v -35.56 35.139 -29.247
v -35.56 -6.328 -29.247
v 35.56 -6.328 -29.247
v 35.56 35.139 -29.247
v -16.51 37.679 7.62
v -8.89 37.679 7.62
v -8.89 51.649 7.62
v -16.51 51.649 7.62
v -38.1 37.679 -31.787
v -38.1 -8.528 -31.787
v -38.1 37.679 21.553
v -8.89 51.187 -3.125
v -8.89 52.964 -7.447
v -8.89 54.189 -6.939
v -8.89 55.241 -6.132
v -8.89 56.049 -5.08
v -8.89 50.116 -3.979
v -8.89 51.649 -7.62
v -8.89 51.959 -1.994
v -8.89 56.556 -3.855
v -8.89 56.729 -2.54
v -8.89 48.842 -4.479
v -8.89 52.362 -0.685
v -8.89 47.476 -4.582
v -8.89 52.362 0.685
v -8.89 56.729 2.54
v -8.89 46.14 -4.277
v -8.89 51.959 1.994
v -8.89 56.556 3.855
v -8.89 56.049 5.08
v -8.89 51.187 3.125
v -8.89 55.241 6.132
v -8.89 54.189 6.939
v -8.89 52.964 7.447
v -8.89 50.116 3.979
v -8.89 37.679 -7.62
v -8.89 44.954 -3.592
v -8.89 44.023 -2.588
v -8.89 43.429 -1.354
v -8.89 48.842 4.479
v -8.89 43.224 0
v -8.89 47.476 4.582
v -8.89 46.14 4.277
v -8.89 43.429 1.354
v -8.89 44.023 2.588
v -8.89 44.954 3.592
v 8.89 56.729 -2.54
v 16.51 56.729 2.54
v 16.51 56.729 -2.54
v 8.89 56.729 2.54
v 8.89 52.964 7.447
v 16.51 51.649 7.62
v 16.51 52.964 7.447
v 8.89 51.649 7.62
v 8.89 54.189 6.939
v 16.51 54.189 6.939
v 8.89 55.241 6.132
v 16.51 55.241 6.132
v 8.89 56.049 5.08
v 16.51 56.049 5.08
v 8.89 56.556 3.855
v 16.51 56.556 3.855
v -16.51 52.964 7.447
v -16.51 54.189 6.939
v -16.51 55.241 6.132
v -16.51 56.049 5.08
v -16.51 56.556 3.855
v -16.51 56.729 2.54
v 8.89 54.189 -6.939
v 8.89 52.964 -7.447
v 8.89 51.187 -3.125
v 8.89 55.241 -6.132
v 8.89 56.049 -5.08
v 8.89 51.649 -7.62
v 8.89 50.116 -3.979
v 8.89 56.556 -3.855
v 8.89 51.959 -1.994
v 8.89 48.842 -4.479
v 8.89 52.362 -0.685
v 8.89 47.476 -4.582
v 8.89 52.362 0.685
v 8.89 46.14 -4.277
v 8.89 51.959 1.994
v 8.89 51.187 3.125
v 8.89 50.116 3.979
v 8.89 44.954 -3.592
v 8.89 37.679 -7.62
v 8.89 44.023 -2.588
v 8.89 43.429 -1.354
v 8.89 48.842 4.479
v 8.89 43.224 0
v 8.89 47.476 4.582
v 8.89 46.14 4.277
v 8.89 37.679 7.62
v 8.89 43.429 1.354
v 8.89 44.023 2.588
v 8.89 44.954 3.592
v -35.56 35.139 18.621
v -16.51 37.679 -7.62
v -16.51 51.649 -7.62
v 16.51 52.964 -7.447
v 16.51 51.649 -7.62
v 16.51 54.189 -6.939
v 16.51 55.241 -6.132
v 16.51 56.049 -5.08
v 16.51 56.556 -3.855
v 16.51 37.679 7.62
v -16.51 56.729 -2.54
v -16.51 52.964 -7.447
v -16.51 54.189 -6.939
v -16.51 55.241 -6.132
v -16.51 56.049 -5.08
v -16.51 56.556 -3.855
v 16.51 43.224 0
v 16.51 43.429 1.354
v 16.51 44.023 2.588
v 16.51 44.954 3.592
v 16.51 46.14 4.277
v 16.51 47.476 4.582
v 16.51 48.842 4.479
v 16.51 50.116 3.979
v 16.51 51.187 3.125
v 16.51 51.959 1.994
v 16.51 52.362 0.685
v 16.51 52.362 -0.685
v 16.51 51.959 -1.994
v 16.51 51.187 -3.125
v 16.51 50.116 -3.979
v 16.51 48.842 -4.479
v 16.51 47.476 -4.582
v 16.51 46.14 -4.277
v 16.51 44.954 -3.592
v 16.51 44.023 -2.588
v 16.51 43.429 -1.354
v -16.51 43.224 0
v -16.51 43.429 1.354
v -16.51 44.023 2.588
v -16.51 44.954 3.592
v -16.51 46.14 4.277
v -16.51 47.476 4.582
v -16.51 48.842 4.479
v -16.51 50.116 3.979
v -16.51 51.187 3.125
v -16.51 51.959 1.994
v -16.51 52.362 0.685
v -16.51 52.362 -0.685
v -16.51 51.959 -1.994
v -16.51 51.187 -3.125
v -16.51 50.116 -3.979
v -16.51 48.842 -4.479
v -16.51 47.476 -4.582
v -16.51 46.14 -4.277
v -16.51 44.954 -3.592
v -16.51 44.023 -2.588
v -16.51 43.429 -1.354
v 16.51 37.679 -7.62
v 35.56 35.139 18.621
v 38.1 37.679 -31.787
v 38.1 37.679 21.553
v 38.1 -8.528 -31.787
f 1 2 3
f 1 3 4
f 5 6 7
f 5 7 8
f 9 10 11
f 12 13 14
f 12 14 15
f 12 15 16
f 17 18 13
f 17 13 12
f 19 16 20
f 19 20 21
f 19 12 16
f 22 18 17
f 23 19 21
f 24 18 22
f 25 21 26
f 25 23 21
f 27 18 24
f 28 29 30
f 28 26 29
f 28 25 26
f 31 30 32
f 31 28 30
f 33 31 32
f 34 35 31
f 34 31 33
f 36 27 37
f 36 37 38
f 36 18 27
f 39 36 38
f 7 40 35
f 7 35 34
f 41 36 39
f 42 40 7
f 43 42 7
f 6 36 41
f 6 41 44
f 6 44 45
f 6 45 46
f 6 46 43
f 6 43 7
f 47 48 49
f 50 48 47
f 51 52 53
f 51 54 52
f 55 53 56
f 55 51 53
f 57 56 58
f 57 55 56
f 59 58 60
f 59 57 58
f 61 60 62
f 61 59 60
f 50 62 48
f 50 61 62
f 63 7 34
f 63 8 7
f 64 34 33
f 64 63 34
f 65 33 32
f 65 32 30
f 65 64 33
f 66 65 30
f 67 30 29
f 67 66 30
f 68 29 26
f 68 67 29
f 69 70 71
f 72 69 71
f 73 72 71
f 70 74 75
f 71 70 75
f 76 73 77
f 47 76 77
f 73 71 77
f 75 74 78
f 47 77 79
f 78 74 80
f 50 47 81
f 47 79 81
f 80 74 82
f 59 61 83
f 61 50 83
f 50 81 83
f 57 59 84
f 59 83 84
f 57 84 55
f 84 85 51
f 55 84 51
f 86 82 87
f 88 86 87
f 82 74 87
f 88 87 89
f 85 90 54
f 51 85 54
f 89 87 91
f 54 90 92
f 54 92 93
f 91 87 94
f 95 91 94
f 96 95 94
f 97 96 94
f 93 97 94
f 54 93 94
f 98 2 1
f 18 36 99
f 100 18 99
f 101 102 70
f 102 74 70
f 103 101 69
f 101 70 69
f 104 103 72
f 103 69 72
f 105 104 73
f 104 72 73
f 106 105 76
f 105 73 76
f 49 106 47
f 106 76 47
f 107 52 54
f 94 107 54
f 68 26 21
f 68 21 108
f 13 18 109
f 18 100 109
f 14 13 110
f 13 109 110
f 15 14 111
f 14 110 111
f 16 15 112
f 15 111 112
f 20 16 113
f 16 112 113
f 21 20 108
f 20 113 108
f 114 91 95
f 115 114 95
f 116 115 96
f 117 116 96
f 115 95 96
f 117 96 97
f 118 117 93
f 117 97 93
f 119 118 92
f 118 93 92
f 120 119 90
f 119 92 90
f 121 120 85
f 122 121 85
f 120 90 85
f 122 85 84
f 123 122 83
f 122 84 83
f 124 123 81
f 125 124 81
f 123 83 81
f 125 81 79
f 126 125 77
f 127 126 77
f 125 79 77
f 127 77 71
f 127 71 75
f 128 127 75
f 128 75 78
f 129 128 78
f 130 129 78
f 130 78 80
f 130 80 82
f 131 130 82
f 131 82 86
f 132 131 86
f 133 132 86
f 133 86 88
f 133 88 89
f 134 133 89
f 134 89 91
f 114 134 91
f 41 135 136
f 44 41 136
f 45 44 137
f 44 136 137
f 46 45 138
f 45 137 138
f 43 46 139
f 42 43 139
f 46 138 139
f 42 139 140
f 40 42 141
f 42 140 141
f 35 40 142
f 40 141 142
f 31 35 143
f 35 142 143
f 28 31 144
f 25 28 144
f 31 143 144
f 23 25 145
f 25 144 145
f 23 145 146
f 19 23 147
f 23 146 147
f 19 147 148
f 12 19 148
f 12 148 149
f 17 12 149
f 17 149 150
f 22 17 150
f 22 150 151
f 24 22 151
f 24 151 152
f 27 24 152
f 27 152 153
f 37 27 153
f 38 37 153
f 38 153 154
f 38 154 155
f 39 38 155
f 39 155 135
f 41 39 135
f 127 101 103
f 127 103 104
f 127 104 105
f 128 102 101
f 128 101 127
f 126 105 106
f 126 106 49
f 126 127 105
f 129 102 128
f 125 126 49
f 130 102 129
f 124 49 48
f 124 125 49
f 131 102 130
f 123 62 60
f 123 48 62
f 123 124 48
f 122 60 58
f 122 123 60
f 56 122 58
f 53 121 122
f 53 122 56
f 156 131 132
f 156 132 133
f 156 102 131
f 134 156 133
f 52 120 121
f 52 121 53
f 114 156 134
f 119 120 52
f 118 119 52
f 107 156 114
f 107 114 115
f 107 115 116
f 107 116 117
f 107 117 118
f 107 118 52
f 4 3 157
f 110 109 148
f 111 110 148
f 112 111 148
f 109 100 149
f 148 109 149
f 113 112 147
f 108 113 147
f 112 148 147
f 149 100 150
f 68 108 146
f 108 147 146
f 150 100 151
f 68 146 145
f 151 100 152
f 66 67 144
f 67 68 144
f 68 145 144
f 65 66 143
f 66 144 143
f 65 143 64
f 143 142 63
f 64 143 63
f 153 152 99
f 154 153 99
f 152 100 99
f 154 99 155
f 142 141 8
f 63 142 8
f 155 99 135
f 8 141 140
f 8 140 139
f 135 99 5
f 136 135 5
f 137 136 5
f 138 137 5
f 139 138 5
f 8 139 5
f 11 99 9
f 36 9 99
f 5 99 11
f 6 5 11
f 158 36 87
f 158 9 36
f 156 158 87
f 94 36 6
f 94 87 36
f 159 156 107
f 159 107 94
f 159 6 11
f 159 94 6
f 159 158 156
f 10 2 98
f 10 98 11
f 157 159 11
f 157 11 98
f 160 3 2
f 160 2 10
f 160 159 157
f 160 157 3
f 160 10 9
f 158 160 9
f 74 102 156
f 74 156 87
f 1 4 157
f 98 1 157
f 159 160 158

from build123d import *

# Parameters (mm, degrees)
F1_DEPTH = 38.1
F2_T     = -2.54
F3_W     = 7.62
F3_H     = 15.24
F4_DEPTH = 19.05
F5_R     = 5.08
F6_R     = 4.594696
F7_DEPTH = 39.878


with BuildPart() as f1:
    # F0 (on Right) → F1 (new body, symmetric)
    with BuildSketch(Plane.YZ):
        Polygon((37.679132, -31.786919), (37.679132, 21.553082), (-8.528198, -31.786919), align=None)
    extrude(amount=F1_DEPTH, both=True)

    # F2
    f2_openings = [f1.faces().sort_by_distance(p)[0] for p in [
        (0, 14.575467, -5.116918),
    ]]
    offset(amount=F2_T, openings=f2_openings)

    # F3 (on face) → F4 (join)
    with BuildSketch(Plane(origin=(0, 37.679132, 0), x_dir=(-1, 0, 0), z_dir=(0, 1, 0))):
        with Locations((-12.7, 0)):
            Rectangle(F3_W, F3_H)
        with Locations((12.7, 0)):
            Rectangle(F3_W, F3_H)
    extrude(amount=F4_DEPTH)

    # F5
    f5_edges = [f1.edges().sort_by_distance(p)[0] for p in [
        (12.7, 56.729132, 7.62),
        (12.7, 56.729132, -7.62),
        (-12.7, 56.729132, -7.62),
        (-12.7, 56.729132, 7.62),
    ]]
    fillet(f5_edges, radius=F5_R)

    # F6 (on face) → F7 (cut)
    with BuildSketch(Plane(origin=(-16.51, 0, 0), x_dir=(0, -1, 0), z_dir=(-1, 0, 0))):
        with Locations((-47.819119, 0)):
            Circle(F6_R)
    extrude(amount=-F7_DEPTH, mode=Mode.SUBTRACT)


solid = f1.part
